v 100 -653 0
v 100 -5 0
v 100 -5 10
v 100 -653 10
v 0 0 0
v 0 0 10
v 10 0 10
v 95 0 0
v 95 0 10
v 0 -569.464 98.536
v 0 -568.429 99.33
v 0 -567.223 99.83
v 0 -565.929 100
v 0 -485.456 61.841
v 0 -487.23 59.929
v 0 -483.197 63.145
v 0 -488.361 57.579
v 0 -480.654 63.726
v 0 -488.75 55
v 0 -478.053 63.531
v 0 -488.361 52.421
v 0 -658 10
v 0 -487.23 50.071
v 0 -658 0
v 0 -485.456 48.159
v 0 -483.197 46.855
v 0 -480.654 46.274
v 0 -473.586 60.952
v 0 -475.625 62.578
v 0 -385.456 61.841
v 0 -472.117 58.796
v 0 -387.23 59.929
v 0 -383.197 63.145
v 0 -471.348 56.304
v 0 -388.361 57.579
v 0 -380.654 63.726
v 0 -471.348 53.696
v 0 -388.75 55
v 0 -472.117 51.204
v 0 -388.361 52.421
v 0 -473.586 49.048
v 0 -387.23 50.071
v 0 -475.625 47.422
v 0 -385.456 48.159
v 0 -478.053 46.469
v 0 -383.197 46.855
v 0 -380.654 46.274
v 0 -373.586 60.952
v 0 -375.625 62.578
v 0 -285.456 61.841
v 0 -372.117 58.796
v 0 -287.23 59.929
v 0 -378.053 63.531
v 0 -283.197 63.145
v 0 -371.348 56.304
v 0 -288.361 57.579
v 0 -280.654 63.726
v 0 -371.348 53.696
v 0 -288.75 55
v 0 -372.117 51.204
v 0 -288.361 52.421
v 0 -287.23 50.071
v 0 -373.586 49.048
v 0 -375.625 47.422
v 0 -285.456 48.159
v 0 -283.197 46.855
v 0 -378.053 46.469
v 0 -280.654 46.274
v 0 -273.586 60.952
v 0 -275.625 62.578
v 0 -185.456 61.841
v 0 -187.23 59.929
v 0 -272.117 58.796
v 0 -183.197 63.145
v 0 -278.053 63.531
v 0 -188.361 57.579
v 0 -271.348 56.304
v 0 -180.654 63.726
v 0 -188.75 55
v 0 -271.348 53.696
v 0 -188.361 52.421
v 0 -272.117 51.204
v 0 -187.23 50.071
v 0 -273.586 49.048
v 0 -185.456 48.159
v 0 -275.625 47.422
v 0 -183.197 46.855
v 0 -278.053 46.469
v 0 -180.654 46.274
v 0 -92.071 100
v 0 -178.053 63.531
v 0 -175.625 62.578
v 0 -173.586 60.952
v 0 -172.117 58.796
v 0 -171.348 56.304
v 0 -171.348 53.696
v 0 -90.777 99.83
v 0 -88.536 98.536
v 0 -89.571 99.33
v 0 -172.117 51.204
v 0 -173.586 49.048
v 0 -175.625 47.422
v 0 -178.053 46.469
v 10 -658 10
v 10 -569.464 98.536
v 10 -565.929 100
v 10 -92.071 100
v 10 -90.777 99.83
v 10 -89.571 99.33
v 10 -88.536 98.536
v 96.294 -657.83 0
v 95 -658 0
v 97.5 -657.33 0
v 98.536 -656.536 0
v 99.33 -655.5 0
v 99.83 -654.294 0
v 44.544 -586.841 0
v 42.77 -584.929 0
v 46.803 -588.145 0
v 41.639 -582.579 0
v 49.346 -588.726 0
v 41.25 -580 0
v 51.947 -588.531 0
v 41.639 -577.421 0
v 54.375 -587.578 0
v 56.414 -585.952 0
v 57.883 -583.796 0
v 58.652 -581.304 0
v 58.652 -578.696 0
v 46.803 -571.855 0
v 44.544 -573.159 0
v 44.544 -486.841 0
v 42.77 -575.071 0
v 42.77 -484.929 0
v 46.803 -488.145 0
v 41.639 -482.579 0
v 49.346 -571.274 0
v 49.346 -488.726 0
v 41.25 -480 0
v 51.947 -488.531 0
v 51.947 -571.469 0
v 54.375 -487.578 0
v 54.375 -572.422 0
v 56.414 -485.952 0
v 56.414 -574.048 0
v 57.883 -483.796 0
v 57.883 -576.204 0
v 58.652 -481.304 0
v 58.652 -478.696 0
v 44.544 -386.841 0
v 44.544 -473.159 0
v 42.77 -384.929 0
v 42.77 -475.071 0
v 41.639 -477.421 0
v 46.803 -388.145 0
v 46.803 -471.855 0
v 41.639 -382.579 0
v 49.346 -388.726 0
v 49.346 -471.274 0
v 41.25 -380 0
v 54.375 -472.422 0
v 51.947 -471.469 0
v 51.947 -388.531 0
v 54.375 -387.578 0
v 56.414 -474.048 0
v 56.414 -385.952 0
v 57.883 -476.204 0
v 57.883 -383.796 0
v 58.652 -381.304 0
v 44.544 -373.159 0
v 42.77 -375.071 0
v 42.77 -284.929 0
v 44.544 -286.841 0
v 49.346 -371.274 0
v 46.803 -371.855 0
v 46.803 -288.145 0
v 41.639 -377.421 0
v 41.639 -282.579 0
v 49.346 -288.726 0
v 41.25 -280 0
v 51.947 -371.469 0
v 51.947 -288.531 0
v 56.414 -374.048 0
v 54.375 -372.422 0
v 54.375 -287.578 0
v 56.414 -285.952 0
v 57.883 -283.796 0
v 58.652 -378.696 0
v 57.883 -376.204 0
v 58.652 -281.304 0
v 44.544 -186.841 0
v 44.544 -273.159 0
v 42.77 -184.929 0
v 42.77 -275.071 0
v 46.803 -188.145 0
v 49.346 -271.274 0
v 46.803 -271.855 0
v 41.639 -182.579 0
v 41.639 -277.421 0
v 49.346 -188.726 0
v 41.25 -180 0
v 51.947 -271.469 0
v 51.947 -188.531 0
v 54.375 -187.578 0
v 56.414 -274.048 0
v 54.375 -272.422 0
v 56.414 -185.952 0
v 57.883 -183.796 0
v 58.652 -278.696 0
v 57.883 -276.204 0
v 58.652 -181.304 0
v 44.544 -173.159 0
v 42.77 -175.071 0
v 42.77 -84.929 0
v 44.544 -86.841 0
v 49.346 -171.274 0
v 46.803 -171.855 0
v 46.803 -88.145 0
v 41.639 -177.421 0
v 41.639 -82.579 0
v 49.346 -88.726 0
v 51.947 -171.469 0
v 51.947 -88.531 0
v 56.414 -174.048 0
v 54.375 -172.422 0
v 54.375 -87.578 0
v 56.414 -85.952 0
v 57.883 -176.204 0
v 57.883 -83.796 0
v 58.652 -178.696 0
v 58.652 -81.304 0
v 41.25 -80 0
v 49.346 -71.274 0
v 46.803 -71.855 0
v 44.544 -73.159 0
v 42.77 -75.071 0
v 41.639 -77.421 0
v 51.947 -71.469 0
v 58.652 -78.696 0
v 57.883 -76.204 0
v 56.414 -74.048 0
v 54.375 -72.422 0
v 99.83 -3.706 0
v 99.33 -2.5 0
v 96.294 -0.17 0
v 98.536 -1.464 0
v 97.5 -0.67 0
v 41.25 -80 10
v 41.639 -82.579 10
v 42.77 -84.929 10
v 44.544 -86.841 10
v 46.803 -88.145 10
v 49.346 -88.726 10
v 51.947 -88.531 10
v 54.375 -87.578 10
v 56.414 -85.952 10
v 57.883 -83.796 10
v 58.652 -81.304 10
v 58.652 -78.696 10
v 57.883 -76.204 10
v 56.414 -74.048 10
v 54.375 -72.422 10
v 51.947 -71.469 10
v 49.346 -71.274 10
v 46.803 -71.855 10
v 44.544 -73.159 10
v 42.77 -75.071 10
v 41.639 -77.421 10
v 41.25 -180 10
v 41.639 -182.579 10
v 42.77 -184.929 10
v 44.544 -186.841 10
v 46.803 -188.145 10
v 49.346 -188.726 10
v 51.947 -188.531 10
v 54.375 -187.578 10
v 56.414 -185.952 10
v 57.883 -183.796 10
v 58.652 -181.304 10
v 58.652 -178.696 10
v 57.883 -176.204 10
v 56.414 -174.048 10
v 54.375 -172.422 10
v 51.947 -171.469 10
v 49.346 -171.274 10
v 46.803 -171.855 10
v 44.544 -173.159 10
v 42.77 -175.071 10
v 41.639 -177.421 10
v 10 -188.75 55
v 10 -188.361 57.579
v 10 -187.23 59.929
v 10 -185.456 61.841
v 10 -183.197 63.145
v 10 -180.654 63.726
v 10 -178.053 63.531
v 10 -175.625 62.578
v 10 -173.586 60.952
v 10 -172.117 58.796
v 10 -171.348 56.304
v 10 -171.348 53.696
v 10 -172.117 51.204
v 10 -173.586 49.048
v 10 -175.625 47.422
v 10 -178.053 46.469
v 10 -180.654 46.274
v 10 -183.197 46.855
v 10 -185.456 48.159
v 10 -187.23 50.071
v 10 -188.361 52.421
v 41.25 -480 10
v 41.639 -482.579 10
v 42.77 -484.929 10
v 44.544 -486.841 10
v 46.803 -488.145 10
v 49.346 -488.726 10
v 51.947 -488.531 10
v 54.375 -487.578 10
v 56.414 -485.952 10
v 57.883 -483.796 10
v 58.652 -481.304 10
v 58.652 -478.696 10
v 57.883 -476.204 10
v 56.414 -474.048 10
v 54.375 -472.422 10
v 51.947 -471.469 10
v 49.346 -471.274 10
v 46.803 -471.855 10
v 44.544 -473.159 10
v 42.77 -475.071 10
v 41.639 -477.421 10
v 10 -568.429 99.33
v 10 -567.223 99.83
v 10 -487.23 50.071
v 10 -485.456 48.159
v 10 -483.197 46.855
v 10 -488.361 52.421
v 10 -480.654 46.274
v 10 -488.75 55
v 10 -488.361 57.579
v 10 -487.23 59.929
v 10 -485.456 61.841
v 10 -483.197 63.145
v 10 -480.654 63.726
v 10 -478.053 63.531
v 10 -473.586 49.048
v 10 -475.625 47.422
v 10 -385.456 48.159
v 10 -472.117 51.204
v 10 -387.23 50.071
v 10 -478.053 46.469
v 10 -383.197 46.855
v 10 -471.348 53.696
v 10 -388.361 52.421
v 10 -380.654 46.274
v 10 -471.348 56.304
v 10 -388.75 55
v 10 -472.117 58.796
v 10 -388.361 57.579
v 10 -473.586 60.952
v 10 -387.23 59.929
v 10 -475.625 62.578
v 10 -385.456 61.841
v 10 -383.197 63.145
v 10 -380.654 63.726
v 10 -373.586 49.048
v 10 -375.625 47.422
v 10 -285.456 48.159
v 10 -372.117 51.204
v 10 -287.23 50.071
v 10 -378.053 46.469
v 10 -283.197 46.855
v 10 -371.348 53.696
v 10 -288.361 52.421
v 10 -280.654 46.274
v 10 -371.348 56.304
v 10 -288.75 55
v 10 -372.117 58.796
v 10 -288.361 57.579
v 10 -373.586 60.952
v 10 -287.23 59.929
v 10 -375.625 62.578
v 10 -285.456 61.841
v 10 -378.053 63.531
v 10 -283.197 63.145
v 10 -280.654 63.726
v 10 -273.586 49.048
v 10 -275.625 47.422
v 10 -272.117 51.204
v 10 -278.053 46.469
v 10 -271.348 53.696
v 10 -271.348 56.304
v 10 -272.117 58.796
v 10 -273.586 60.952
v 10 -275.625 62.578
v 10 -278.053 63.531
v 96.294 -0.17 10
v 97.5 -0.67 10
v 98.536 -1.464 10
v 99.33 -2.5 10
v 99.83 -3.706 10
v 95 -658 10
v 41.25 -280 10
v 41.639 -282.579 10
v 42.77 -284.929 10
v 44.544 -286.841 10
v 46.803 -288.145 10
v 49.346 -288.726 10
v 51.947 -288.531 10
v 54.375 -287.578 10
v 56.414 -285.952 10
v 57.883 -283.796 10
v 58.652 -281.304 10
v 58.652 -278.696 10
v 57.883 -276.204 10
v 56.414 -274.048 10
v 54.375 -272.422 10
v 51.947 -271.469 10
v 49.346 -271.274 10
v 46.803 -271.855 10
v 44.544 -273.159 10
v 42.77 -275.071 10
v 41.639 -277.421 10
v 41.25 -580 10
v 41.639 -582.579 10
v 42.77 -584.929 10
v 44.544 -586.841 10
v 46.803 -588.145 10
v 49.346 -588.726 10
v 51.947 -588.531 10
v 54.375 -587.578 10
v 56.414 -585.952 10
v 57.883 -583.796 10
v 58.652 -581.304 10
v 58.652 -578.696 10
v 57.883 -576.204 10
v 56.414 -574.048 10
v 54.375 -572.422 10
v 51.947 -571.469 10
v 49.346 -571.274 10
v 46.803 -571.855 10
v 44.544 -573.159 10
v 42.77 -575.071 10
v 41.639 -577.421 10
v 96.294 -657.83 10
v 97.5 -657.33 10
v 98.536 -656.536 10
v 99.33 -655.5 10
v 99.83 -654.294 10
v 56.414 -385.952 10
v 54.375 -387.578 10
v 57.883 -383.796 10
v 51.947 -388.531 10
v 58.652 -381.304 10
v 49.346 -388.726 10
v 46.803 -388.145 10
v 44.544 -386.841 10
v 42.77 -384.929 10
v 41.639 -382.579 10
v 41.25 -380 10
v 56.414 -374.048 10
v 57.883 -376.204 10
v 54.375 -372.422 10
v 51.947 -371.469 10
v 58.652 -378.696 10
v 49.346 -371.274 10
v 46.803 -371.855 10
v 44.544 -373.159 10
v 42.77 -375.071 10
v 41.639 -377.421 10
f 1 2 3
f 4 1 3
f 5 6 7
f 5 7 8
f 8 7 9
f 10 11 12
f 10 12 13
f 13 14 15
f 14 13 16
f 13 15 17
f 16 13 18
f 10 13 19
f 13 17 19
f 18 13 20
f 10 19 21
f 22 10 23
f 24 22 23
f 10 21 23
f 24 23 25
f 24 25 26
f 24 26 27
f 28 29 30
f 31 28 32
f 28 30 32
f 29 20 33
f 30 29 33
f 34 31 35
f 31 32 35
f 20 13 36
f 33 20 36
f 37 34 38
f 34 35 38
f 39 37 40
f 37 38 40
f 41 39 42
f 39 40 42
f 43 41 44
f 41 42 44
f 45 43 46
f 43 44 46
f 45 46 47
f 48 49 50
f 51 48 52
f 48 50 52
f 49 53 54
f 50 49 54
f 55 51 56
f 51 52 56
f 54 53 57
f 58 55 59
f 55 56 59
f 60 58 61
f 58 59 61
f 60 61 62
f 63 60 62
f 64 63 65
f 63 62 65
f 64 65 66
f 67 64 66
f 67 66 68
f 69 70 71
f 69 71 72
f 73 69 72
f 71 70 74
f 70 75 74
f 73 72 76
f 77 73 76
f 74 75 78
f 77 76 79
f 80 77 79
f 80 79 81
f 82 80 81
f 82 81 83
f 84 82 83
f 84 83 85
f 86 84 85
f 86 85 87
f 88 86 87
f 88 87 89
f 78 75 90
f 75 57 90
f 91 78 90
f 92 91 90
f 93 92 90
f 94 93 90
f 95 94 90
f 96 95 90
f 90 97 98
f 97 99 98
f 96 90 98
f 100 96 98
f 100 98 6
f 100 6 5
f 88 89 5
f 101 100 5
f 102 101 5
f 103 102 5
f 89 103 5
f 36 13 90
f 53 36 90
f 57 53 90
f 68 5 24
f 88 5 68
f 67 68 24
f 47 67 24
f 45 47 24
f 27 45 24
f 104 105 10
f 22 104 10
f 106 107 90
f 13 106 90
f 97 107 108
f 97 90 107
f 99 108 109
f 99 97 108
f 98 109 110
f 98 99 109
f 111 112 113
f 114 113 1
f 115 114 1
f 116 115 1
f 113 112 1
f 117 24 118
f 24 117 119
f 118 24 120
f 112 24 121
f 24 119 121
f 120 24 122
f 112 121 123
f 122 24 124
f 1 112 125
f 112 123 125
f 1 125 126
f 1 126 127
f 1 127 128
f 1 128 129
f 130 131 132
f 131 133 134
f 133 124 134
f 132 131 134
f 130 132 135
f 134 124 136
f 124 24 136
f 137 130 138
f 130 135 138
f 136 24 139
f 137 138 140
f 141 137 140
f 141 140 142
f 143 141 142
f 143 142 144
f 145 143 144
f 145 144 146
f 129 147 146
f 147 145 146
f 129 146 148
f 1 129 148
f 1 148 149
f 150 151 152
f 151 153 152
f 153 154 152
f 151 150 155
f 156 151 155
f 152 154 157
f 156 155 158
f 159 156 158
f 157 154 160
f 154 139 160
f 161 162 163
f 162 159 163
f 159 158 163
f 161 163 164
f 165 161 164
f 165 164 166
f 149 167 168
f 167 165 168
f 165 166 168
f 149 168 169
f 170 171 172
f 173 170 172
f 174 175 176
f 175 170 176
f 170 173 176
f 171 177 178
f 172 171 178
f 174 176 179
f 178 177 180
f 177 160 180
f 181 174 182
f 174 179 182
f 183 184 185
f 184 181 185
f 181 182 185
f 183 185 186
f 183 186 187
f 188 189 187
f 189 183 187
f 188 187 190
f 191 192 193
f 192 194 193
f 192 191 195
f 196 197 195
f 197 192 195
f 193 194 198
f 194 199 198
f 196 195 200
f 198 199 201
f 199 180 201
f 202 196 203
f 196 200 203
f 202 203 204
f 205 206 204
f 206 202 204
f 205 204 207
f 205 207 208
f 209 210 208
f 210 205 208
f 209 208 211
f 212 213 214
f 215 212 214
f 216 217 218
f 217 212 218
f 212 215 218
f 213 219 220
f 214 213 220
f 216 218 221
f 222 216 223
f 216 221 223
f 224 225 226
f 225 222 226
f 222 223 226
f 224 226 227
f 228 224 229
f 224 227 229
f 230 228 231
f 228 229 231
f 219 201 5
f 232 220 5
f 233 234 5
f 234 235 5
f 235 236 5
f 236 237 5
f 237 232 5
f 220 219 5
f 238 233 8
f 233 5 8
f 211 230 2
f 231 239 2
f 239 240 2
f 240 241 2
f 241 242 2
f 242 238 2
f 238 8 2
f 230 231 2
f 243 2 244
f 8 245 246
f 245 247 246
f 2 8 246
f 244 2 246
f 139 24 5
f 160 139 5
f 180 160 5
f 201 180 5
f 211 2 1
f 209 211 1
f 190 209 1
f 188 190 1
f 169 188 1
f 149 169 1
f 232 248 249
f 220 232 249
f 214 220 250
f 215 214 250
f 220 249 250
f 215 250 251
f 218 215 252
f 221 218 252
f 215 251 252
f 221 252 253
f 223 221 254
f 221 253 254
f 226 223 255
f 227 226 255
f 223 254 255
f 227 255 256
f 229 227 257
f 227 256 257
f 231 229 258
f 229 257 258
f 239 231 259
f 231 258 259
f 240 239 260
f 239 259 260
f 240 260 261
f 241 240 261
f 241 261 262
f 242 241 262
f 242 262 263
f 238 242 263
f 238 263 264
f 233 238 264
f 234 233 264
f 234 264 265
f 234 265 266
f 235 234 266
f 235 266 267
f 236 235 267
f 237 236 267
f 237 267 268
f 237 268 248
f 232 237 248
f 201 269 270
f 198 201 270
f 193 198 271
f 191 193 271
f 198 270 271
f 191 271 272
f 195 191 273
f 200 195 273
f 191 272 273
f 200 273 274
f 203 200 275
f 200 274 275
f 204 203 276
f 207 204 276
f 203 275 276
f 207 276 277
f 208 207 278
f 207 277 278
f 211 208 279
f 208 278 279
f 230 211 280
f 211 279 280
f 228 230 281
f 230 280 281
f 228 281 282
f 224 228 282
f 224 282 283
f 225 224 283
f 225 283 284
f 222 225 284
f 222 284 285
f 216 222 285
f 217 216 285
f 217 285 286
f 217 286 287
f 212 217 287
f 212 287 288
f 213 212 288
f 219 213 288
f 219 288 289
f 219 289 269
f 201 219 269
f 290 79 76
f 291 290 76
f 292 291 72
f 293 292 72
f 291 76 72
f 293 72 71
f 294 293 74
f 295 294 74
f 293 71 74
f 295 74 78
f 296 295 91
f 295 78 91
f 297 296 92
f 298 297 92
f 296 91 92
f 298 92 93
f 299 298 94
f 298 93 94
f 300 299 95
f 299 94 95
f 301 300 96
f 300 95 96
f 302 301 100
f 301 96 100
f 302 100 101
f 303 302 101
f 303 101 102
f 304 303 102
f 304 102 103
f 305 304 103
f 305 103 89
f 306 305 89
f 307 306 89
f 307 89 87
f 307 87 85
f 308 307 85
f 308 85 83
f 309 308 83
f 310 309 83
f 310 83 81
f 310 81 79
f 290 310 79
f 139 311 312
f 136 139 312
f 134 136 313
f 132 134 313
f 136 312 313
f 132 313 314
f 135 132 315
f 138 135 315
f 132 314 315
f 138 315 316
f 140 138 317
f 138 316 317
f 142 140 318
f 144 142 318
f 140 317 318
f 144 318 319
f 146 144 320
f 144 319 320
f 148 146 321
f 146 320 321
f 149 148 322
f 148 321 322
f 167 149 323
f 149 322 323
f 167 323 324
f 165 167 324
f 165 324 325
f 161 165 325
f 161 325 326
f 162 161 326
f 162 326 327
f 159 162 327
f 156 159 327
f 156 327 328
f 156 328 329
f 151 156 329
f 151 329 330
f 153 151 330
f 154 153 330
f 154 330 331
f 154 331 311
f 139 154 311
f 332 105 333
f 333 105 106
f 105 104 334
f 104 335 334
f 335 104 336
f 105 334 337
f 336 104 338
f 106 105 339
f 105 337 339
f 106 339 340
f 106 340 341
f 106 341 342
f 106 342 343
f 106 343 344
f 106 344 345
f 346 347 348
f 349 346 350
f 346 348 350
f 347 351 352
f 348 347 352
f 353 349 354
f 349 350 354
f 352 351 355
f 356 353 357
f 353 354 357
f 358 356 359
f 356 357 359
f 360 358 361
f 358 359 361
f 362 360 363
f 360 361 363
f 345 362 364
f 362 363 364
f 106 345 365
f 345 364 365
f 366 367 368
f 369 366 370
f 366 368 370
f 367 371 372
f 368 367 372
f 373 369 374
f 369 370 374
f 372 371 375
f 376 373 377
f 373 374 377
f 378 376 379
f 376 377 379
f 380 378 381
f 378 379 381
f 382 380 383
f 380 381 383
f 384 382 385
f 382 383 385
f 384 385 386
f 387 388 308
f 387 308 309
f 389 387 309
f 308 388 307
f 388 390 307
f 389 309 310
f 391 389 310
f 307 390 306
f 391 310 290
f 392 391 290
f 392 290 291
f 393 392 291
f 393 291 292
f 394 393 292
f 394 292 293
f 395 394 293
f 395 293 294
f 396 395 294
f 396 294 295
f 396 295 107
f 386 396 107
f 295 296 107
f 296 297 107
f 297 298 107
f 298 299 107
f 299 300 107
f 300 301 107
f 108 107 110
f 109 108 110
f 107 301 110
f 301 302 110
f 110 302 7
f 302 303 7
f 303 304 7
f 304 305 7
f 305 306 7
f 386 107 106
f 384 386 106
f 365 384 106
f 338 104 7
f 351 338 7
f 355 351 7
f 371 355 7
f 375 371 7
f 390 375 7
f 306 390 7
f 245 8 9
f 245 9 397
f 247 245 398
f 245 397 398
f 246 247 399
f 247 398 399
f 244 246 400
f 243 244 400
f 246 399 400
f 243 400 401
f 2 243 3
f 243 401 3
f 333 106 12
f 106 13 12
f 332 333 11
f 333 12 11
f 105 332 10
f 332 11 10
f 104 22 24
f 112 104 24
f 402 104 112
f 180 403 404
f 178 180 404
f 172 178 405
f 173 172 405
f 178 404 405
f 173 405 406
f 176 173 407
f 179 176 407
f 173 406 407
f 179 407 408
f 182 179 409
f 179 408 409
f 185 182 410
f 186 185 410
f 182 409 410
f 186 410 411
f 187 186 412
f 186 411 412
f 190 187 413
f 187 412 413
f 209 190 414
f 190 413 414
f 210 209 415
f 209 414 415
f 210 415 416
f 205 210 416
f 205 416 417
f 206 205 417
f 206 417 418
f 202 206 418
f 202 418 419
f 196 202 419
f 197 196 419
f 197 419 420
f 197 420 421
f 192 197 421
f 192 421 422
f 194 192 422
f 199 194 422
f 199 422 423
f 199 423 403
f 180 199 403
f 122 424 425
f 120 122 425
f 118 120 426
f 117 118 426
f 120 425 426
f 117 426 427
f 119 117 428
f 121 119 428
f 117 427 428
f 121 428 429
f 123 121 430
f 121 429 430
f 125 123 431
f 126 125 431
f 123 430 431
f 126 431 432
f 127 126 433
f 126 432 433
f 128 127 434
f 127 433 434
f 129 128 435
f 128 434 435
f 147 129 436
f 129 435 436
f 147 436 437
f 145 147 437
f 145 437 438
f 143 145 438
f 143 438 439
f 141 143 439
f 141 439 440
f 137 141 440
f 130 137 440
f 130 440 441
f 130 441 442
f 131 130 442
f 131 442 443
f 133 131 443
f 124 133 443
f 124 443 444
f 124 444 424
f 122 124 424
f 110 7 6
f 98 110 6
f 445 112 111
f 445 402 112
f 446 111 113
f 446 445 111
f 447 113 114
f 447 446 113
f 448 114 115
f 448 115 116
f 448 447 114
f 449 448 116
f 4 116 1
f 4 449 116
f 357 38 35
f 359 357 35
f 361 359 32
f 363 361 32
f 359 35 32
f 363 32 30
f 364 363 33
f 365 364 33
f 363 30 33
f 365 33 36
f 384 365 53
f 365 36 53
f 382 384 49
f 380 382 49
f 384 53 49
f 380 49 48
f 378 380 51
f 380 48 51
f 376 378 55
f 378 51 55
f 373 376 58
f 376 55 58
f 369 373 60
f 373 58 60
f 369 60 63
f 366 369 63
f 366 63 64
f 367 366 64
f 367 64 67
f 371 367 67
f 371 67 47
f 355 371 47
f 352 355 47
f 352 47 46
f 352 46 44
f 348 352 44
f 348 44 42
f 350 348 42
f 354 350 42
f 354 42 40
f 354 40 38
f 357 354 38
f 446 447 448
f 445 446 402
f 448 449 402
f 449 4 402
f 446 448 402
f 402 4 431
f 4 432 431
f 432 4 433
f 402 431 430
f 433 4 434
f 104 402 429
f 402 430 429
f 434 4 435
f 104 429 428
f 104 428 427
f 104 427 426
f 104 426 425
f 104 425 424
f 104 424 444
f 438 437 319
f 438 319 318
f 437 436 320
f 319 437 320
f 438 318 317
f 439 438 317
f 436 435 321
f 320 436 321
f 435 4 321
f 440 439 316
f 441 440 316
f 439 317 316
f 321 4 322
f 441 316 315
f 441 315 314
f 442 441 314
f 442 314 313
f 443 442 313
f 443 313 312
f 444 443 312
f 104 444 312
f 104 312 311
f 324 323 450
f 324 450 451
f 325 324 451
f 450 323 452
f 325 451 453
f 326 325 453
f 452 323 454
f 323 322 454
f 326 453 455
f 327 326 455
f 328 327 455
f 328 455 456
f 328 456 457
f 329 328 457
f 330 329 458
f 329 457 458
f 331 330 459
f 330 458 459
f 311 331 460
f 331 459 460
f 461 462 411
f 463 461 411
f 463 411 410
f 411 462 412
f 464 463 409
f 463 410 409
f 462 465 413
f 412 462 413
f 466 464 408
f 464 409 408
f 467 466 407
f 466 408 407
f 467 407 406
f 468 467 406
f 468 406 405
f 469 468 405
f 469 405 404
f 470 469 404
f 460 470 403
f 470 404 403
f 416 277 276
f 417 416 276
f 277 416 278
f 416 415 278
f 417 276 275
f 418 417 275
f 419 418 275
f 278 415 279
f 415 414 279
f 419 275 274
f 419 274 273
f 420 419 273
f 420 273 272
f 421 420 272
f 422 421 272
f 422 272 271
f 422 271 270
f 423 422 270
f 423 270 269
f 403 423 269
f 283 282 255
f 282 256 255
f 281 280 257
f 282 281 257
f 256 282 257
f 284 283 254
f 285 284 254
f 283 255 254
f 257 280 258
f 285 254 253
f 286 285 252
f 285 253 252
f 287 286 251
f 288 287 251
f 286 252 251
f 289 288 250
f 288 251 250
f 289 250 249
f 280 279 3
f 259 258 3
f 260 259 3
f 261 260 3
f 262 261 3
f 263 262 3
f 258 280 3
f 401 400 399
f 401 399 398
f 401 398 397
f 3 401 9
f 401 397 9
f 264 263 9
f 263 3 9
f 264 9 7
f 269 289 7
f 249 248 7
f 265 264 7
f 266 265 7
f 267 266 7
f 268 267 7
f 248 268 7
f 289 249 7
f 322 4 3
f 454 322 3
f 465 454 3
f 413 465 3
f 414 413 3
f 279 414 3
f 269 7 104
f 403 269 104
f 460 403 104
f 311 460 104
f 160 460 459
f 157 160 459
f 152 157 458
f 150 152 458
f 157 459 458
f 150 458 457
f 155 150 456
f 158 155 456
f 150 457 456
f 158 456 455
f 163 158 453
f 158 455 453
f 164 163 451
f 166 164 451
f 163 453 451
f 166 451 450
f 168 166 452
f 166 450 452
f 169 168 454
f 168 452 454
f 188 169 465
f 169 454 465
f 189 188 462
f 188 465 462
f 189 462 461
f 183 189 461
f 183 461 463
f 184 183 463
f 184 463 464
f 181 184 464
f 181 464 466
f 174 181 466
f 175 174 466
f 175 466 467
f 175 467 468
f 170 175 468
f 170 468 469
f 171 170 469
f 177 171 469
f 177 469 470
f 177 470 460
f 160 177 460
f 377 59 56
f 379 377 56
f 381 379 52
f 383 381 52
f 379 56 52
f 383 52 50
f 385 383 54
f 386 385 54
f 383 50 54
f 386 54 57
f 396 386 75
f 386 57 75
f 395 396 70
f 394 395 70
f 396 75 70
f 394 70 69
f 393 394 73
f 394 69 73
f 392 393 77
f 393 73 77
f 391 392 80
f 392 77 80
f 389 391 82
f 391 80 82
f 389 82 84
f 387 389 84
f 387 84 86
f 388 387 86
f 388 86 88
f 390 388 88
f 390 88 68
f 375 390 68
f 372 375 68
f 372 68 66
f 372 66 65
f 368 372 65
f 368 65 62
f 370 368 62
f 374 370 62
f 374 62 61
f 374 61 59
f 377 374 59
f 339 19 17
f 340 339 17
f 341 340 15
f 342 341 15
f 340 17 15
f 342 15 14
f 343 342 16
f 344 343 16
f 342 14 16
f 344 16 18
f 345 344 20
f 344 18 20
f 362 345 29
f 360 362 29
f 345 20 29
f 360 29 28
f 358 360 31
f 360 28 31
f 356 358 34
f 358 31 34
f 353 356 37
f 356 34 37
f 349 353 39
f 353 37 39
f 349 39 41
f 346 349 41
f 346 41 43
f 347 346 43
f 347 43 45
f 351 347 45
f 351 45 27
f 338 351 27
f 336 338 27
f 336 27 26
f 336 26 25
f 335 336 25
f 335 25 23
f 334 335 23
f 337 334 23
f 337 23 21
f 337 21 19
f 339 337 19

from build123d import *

# Parameters (mm, degrees)
F1_DEPTH = 658
F3_D     = 17.5
F5_D     = 17.5
F7_SIZE  = 90
F8_R     = 5


with BuildPart() as f1:
    # F0 (on Front) → F1 (new body)
    with BuildSketch(Plane.XZ):
        Polygon((0, 100), (0, 0), (100, 0), (100, 10), (10, 10), (10, 100), align=None)
    extrude(amount=F1_DEPTH)

    # F3 (through all)
    with Locations(Plane.YZ.offset(10)):
        with Locations((-180, 55), (-280, 55), (-380, 55), (-480, 55)):
            Hole(F3_D / 2)

    # F5 (through all)
    with Locations(Plane(origin=(0, 0, 0), x_dir=(1, 0, 0), z_dir=(0, 0, -1))):
        with Locations((50, 580), (50, 480), (50, 380), (50, 280), (50, 180), (50, 80)):
            Hole(F5_D / 2)

    # F7
    f7_edges = [f1.edges().sort_by_distance(p)[0] for p in [
        (5, -658, 100),
        (5, 0, 100),
    ]]
    chamfer(f7_edges, length=F7_SIZE)

    # F8
    f8_edges = [f1.edges().sort_by_distance(p)[0] for p in [
        (5, -90, 100),
        (100, 0, 5),
        (5, -568, 100),
        (100, -658, 5),
    ]]
    fillet(f8_edges, radius=F8_R)


solid = f1.part
